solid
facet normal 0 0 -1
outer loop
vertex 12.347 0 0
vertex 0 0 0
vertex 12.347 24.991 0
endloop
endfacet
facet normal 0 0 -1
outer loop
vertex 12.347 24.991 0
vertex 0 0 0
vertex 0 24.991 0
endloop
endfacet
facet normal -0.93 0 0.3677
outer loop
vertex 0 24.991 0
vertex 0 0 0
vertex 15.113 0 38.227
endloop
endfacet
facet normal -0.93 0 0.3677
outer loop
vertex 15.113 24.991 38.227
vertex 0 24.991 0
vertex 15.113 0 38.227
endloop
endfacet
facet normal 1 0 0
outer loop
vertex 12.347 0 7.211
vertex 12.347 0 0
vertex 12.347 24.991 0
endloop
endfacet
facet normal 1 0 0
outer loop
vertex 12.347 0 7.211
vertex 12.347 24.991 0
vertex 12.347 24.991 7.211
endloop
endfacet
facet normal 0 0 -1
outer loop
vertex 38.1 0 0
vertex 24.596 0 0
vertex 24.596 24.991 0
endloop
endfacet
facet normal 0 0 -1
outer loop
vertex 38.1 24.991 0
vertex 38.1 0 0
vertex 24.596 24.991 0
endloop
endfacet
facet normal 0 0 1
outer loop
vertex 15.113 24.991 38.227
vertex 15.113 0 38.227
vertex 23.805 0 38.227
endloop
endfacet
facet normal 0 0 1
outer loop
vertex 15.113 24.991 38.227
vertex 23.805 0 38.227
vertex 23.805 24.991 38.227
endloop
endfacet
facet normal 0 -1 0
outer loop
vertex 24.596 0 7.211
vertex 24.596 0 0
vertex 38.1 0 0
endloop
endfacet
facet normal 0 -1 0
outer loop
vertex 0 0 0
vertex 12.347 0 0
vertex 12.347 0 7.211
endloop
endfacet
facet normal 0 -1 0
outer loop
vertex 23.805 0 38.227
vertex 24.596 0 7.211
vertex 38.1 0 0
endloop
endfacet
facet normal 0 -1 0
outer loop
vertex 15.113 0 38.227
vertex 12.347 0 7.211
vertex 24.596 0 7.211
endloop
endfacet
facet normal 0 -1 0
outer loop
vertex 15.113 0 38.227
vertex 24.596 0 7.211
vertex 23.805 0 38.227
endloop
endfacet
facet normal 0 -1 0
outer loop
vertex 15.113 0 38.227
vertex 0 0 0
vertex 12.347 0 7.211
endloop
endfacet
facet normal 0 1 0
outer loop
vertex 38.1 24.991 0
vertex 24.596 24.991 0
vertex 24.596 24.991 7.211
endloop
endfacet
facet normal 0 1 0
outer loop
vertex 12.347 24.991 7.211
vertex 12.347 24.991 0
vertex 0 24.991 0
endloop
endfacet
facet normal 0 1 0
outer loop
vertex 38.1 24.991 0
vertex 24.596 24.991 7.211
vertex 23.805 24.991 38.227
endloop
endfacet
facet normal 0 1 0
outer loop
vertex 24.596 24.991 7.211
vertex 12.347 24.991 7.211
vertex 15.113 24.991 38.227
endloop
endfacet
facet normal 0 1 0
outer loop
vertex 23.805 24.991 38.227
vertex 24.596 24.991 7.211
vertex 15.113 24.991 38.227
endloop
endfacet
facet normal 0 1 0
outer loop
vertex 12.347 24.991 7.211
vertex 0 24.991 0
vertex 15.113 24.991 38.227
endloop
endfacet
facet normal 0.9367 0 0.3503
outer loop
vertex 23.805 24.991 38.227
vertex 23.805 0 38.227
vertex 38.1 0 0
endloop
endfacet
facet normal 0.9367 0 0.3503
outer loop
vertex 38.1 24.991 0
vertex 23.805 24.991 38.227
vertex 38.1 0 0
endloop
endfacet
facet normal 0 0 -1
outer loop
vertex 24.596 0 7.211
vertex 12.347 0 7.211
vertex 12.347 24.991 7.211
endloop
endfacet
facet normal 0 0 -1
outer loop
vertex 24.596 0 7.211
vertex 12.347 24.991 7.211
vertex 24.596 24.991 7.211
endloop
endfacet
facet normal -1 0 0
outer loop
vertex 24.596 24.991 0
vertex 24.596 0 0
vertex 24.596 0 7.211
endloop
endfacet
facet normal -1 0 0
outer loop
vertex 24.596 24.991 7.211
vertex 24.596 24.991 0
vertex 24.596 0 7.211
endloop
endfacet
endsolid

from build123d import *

# Parameters (mm, degrees)
F0_W     = 24.9907784164
F0_H     = 38.2269993424
F1_DEPTH = 38.1
F2_W     = 12.2484434396
F2_H     = 7.2107780725
F3_DEPTH = 24.9917784164
F5_DEPTH = 24.9917784164


with BuildPart() as f1:
    # F0 (on Right) → F1 (new body)
    with BuildSketch(Plane.YZ):
        with Locations((12.4953892082, 19.1134996712)):
            Rectangle(F0_W, F0_H)
    extrude(amount=F1_DEPTH)

    # F2 (on face) → F3 (cut, through all)
    with BuildSketch(Plane.XZ):
        with Locations((18.471444957, 3.6053890362)):
            Rectangle(F2_W, F2_H)
    extrude(amount=-F3_DEPTH, mode=Mode.SUBTRACT)

    # F4 (on face) → F5 (cut, through all)
    with BuildSketch(Plane.XZ):
        Polygon((0, 0), (15.113000758, 38.2269993424), (0, 38.2269993424), align=None)
        Polygon((38.1, 38.2269993424), (23.8054450601, 38.2269993424), (38.1, 0), align=None)
    extrude(amount=-F5_DEPTH, mode=Mode.SUBTRACT)


solid = f1.part
